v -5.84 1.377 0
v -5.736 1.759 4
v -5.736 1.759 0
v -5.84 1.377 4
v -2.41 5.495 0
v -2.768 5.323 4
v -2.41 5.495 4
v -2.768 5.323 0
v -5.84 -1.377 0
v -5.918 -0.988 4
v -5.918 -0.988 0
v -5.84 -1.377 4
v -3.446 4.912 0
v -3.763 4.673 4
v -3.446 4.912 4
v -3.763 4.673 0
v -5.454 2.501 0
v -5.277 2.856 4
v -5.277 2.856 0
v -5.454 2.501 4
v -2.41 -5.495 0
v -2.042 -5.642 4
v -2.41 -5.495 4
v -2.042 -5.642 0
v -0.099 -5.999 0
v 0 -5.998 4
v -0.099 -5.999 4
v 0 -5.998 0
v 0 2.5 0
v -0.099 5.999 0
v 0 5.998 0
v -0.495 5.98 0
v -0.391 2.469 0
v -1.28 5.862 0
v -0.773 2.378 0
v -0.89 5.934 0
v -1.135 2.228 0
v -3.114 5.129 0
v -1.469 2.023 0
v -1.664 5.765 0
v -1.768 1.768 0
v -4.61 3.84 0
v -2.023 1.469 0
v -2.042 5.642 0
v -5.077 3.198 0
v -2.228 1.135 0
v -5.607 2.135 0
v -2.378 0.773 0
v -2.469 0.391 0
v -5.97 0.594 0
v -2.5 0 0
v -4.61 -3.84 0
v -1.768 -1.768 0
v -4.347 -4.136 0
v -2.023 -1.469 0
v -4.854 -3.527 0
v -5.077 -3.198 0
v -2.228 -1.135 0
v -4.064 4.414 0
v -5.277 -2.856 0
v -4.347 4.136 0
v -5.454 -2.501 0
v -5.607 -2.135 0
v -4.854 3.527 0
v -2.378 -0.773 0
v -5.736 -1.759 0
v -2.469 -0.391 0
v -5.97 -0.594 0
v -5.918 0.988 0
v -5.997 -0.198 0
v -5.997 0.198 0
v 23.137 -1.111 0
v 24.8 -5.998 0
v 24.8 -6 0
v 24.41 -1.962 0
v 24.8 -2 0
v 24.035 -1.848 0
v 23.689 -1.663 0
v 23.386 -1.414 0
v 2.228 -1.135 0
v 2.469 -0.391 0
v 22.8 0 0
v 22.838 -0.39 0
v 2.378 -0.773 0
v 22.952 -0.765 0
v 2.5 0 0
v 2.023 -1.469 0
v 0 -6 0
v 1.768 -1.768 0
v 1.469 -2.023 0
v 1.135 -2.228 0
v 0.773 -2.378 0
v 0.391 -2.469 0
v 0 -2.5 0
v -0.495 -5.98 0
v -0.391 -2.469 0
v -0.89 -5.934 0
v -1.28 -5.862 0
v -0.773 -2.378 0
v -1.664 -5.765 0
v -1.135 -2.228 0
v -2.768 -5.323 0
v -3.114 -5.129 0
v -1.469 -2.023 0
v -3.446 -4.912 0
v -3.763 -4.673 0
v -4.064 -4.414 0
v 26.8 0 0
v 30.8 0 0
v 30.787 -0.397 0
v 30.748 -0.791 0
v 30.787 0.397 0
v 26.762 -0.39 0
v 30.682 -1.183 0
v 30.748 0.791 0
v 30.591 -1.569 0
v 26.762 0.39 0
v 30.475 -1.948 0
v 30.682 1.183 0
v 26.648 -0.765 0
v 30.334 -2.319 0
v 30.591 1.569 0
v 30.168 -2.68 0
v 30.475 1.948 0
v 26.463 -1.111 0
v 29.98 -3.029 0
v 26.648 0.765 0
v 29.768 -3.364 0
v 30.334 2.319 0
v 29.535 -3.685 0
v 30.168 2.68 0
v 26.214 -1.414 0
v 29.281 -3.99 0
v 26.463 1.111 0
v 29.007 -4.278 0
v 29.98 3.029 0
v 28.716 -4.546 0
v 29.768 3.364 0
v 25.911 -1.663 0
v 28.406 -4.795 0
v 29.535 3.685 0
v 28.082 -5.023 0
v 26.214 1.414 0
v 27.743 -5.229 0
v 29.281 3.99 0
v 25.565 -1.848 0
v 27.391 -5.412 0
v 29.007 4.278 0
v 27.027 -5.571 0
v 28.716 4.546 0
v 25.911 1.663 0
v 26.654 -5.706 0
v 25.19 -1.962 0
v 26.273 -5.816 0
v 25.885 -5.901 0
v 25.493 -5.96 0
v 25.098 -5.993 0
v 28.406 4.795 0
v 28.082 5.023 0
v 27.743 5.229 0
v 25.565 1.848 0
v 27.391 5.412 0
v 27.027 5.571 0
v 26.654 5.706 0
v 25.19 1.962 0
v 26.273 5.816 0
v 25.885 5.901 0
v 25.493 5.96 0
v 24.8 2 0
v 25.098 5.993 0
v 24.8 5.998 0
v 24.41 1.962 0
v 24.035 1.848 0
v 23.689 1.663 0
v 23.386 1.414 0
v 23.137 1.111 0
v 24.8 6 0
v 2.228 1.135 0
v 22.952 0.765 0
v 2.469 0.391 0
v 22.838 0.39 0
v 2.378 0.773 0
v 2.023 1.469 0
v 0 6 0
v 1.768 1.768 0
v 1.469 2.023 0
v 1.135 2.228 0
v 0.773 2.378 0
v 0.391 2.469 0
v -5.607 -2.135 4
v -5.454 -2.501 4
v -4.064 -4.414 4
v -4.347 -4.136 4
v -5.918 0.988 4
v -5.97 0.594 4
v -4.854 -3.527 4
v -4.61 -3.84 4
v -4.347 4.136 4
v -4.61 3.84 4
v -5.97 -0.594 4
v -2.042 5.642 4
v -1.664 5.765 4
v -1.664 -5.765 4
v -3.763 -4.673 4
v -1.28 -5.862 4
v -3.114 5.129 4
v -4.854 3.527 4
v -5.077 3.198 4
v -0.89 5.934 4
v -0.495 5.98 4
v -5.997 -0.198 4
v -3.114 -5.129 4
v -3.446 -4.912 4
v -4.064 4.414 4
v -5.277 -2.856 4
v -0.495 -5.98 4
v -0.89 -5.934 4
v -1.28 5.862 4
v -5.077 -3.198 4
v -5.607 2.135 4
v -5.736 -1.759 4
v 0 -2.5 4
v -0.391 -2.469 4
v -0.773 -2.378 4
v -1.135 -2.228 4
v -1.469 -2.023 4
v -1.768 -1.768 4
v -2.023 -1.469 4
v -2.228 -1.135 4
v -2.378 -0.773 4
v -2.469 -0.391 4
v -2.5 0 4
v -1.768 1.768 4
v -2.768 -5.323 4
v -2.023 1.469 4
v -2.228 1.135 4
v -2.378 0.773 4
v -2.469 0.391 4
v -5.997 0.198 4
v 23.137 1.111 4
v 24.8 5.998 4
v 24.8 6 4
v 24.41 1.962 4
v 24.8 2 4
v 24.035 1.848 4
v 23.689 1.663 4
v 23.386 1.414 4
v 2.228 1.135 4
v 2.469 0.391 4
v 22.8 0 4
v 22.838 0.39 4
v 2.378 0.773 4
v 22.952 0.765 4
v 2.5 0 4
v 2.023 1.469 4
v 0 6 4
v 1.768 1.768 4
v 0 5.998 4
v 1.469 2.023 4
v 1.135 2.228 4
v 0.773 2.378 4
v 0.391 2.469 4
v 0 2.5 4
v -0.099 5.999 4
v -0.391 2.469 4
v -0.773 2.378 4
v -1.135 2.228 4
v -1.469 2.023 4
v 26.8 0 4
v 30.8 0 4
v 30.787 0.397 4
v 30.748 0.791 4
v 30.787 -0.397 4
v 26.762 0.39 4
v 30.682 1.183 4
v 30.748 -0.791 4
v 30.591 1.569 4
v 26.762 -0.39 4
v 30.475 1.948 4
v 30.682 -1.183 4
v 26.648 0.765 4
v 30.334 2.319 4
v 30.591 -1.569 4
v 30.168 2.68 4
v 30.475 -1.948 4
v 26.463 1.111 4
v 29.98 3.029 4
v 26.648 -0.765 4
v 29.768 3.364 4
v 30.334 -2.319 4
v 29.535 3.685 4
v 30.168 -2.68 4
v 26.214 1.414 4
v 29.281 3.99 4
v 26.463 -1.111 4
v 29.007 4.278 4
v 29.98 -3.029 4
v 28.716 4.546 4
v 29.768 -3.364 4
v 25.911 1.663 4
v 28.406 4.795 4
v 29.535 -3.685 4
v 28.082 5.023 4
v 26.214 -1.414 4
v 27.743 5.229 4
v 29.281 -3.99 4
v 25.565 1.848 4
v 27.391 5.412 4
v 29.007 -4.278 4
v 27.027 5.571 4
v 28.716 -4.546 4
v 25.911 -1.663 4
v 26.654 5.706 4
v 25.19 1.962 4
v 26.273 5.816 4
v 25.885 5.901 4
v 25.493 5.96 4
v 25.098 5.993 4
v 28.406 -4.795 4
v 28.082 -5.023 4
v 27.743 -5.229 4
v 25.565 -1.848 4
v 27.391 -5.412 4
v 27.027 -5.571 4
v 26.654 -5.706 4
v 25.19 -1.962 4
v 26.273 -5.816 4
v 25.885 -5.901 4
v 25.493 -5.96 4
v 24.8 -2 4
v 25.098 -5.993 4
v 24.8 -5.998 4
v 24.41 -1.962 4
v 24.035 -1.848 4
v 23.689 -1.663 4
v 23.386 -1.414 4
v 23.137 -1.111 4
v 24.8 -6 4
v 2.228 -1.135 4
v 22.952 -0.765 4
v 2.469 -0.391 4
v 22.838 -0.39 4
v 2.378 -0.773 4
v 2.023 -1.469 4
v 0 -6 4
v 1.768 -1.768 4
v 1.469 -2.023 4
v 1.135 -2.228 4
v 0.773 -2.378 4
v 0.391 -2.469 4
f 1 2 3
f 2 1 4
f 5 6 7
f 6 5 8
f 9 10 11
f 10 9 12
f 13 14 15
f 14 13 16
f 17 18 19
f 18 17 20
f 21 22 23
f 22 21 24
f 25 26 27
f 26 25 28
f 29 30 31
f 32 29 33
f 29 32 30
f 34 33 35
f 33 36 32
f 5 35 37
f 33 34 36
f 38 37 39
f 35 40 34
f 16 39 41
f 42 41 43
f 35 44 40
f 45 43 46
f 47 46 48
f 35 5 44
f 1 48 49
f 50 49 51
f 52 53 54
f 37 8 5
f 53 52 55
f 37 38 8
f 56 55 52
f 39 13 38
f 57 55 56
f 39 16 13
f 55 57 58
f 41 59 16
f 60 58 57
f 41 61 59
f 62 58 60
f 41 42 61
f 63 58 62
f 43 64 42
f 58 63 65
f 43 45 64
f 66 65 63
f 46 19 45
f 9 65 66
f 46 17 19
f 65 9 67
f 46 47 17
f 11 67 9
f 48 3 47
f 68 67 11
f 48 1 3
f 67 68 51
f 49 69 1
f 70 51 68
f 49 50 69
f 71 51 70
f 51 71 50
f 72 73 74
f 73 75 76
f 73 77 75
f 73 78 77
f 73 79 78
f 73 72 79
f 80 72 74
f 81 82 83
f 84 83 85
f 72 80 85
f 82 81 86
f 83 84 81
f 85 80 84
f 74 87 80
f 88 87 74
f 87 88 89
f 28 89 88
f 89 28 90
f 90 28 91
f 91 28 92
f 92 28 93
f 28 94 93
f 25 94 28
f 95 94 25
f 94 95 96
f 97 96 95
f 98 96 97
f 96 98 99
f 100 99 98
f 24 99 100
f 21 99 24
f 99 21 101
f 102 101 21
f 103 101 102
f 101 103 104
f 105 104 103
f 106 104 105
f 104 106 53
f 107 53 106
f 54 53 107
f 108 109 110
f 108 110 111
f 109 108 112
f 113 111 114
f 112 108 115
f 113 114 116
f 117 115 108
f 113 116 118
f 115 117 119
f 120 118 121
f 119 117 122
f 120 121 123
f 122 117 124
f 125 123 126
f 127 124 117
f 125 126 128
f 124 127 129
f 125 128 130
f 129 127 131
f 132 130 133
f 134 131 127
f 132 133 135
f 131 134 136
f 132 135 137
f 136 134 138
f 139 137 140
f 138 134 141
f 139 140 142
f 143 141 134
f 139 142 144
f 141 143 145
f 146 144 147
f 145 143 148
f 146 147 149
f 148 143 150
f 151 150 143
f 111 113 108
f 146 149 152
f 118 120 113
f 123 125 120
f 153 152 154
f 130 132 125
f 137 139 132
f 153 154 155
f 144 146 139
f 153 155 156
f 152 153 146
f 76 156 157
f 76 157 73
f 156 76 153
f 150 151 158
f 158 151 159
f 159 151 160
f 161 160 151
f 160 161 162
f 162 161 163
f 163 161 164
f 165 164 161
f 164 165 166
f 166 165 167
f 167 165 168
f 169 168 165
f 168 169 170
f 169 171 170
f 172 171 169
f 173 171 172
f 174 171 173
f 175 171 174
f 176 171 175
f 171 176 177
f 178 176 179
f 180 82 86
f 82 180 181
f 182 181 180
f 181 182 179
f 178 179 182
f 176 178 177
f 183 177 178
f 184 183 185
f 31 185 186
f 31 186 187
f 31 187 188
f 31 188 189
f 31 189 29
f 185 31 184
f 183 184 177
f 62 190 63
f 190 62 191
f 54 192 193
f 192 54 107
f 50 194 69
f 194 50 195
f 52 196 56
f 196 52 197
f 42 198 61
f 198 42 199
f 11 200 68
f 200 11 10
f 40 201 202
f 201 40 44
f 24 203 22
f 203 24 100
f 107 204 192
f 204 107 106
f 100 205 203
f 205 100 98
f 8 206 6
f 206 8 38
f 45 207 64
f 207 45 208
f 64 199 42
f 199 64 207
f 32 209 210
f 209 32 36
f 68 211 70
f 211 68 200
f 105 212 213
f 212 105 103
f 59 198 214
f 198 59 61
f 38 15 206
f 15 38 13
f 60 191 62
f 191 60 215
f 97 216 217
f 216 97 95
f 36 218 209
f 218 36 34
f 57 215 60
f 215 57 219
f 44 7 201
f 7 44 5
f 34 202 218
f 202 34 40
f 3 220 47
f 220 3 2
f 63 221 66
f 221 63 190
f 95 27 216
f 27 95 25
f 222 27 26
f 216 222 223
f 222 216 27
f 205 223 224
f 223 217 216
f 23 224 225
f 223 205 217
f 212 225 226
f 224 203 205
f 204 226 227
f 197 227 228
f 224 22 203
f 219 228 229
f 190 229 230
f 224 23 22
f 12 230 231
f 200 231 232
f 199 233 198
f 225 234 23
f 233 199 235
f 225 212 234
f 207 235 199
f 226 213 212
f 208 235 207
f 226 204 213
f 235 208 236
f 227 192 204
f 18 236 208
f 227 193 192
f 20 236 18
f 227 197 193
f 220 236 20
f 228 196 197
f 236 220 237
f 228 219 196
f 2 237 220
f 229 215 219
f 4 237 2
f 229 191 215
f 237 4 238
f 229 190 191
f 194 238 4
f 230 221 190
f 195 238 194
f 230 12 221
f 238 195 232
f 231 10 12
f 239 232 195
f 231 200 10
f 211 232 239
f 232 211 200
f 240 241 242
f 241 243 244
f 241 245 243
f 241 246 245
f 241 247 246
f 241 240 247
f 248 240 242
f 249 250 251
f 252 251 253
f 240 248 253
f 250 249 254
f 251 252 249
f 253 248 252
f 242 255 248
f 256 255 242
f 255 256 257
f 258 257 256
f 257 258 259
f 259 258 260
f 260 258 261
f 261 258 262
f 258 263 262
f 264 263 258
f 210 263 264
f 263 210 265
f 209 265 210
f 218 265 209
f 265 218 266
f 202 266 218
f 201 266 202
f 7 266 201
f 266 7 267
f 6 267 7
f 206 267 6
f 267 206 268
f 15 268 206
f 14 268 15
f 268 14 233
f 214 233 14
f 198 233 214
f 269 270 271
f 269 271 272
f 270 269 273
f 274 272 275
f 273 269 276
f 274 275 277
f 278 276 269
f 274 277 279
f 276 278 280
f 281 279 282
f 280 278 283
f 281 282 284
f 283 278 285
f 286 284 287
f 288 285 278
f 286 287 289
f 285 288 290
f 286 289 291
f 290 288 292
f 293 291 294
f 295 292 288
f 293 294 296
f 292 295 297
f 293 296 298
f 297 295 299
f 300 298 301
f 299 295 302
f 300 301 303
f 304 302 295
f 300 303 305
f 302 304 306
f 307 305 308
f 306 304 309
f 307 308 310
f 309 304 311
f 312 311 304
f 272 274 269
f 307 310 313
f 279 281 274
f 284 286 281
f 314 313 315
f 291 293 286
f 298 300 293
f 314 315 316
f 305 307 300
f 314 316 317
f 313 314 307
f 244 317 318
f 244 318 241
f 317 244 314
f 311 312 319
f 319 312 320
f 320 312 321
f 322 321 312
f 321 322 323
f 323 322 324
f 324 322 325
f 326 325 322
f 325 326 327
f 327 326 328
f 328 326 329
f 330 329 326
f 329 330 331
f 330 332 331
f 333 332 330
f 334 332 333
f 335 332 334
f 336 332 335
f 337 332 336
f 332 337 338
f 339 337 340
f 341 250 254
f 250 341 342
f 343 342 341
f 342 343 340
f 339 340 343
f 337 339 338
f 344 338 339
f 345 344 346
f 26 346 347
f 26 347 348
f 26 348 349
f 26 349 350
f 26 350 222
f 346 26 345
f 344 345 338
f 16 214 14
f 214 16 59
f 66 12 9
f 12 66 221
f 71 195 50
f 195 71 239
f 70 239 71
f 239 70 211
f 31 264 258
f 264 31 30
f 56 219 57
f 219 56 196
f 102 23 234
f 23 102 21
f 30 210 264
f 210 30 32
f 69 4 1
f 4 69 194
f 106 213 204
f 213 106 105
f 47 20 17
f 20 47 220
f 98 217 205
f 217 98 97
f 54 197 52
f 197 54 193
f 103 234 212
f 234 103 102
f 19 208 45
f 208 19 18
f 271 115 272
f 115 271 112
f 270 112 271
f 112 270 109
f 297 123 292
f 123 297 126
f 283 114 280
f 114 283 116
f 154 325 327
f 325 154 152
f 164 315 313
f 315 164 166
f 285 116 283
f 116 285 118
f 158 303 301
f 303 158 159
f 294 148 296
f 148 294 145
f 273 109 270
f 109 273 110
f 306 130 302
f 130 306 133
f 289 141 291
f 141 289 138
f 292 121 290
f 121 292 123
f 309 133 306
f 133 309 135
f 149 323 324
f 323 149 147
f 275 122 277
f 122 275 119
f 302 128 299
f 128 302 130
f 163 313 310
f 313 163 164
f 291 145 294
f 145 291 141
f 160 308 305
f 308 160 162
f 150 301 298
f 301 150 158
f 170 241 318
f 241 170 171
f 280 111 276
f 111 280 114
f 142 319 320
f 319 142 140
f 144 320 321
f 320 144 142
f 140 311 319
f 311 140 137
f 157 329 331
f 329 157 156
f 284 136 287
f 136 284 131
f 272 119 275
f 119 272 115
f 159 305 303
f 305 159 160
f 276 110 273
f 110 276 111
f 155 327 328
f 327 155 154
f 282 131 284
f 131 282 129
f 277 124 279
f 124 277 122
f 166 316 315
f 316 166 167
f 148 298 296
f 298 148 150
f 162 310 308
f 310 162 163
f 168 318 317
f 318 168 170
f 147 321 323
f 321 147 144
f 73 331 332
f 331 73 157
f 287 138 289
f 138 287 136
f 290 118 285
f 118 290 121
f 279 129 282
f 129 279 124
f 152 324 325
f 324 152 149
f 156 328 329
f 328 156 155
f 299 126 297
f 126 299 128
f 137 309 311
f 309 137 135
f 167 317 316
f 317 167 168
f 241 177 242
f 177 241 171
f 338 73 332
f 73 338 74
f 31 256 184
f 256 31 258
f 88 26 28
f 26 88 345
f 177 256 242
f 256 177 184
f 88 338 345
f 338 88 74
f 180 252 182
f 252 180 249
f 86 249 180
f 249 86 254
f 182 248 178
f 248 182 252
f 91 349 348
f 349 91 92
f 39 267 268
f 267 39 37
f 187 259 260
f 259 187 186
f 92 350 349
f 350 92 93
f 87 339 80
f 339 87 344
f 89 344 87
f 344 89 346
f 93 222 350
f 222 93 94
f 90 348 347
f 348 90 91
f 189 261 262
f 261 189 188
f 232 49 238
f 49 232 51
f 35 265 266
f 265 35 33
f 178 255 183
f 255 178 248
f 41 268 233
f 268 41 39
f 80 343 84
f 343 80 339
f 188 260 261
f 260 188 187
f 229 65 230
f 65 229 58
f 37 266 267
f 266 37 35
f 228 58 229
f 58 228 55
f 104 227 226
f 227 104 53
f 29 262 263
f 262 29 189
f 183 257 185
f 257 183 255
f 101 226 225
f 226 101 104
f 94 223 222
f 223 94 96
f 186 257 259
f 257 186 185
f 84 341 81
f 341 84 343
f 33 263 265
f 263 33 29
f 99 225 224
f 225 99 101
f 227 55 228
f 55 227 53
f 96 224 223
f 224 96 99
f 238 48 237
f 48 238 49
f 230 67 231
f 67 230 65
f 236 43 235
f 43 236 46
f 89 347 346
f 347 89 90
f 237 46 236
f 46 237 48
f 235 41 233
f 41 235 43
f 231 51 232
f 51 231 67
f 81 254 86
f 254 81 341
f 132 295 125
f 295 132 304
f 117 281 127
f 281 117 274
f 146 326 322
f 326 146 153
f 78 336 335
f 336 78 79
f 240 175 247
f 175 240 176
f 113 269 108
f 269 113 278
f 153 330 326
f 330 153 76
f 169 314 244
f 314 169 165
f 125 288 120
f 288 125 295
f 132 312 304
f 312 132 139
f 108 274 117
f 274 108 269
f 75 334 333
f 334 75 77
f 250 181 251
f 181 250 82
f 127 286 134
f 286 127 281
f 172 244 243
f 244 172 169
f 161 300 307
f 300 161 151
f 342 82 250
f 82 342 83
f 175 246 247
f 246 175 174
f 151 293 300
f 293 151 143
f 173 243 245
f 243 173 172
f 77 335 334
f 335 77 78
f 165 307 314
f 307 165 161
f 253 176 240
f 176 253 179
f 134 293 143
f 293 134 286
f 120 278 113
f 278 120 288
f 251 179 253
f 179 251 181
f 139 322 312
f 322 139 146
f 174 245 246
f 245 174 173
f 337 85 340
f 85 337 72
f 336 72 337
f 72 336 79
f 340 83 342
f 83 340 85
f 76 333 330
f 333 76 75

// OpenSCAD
// file: ../../lib/lib.scad
function sel(v, indices) = [ for (i = indices) v[i] ];
function eps() = 0.01;

module cmirror(v = [1, 0, 0])
{
	children();
	mirror(v)
		children();
}

module rcube2d
(
	s = [10, 10, 10],
	r = 2,
	singleSided = false,
)
{
	width = s[0];
	depth = s[1];
	height = s[2];

	union()
	{
		cmirror([0, 1, 0])
		cmirror()
		translate([width / 2 - r, depth / 2 - r, 0])
		cylinder(h = height, r = r);
		translate([r - width / 2, -depth / 2, 0])
		cube([width - r*2, depth, height]);
		translate([-width / 2, r - depth / 2, 0])
		cube([width, depth - r*2, height]);
	}

	if (singleSided)
	{
		translate([-width / 2, -depth / 2, 0])
		cube([width, r, height]);
	}
}

module rcube3d
(
	s = [10, 10, 10],
	r = 2,
	singleSided = false,
)
{
	width = s[0];
	depth = s[1];
	height = s[2];

	w2 = width - r*2;
	d2 = depth - r*2;
	h2 = height - r*2;

	translate([0, 0, r])
	rcube2d([width, depth, h2], r);

	translate([0, 0, height / 2])
	cmirror([0, 0, 1])
	cmirror([0, 1, 0])
	translate([0, d2 / 2, height / 2 - r])
	translate([-w2 / 2, 0, 0])
	rotate([0, 90, 0])
	cylinder(h = w2, r = r);

	translate([0, 0, height / 2])
	cmirror([0, 0, 1])
	cmirror()
	translate([w2 / 2, 0, h2 / 2])
	translate([0, d2 / 2, 0])
	rotate([90, 0, 0])
	cylinder(h = d2, r = r);

	translate([-w2 / 2, -d2 / 2, 0])
	cube([w2, d2, height]);

	translate([0, 0, height / 2])
	cmirror([0, 0, 1])
	cmirror([0, 1, 0])
	cmirror()
	translate([w2 / 2, d2 / 2, h2 / 2])
	sphere(r);

	if (singleSided)
	{
		translate([0, -depth / 2, height / 2])
		rotate([-90, 0, 0])
		rcube2d([width, height, r], r);
	}
}

module rcube
(
	s = [10, 10, 10],
	r = 2,
	flat = true,
	singleSided = false,
	aX = 0,
	aY = 0,
	aZ = 0,
)
{
	width = s[0];
	depth = s[1];
	height = s[2];

	ref = min(width, depth);
	rSat = min(r, ref/2);

	translate
	([
		(1 - aX) * width / 2,
		(1 - aY) * depth / 2,
		-aZ * height / 2
	])
	if (flat)
		rcube2d(s, rSat, singleSided);
	else
	{
		rhSat = min(rSat, height/2);
		rcube3d(s, rhSat, singleSided);
	}
}

module chamfer
(
	s = [10, 20, 6],
	round = true,
	aX = 0,
	aY = 0,
	aZ = 0,
	rotation = 0,
)
{
	width = s[0];
	depth = s[1];
	height = s[2];

	r = width < height ? width : height;

	rotate([0, rotation * 90, 0])
	translate
	([
		-aX * r / 2,
		-aY * depth / 2,
		-aZ * r / 2
	])
	if (round)
	{
		difference()
		{
			cube(s);

			translate([r, -depth / 2, 0])
			union()
			{
				translate([0, 0, r])
				rotate([-90, 0, 0])
				cylinder(d = 2 * r, h = 2 * depth);

				translate([0, 0, -r / 2])
				cube([2 * width, 2 * depth, 2 * r]);

				translate([-1.5 * r, 0, r])
				cube([2 * r, 2 * depth, 2 * height]);
			}
		}
	}
	else
	{
		difference()
		{
			cube(s);

			translate([0, 1.5 * depth, 0])
			rotate([90, 0, 0])
			linear_extrude(2 * depth)
			polygon
			([
				[ 2 * width, -1 * height],
				[ 2 * width,  2 * height],
				[-1 * width,  2 * height],
			]);
		}
	}
}
// main file
$fa = 1.0;
$fs = 0.4;

use <../../lib/lib.scad>

dist = 24.8;
hei = 4;
wid = 12;

difference()
{
	union()
	{
		cylinder(h = hei, d = wid);

		translate([dist, 0, 0])
			cylinder(h = hei, d = wid);

		translate([0, -0.5*wid, 0])
			cube([dist, wid, hei]);
	}

	translate([0, 0, -1])
		cylinder(h = hei + 2, d = 5);

	translate([dist, 0, -1])
		cylinder(h = hei + 2, d = 4);
}
